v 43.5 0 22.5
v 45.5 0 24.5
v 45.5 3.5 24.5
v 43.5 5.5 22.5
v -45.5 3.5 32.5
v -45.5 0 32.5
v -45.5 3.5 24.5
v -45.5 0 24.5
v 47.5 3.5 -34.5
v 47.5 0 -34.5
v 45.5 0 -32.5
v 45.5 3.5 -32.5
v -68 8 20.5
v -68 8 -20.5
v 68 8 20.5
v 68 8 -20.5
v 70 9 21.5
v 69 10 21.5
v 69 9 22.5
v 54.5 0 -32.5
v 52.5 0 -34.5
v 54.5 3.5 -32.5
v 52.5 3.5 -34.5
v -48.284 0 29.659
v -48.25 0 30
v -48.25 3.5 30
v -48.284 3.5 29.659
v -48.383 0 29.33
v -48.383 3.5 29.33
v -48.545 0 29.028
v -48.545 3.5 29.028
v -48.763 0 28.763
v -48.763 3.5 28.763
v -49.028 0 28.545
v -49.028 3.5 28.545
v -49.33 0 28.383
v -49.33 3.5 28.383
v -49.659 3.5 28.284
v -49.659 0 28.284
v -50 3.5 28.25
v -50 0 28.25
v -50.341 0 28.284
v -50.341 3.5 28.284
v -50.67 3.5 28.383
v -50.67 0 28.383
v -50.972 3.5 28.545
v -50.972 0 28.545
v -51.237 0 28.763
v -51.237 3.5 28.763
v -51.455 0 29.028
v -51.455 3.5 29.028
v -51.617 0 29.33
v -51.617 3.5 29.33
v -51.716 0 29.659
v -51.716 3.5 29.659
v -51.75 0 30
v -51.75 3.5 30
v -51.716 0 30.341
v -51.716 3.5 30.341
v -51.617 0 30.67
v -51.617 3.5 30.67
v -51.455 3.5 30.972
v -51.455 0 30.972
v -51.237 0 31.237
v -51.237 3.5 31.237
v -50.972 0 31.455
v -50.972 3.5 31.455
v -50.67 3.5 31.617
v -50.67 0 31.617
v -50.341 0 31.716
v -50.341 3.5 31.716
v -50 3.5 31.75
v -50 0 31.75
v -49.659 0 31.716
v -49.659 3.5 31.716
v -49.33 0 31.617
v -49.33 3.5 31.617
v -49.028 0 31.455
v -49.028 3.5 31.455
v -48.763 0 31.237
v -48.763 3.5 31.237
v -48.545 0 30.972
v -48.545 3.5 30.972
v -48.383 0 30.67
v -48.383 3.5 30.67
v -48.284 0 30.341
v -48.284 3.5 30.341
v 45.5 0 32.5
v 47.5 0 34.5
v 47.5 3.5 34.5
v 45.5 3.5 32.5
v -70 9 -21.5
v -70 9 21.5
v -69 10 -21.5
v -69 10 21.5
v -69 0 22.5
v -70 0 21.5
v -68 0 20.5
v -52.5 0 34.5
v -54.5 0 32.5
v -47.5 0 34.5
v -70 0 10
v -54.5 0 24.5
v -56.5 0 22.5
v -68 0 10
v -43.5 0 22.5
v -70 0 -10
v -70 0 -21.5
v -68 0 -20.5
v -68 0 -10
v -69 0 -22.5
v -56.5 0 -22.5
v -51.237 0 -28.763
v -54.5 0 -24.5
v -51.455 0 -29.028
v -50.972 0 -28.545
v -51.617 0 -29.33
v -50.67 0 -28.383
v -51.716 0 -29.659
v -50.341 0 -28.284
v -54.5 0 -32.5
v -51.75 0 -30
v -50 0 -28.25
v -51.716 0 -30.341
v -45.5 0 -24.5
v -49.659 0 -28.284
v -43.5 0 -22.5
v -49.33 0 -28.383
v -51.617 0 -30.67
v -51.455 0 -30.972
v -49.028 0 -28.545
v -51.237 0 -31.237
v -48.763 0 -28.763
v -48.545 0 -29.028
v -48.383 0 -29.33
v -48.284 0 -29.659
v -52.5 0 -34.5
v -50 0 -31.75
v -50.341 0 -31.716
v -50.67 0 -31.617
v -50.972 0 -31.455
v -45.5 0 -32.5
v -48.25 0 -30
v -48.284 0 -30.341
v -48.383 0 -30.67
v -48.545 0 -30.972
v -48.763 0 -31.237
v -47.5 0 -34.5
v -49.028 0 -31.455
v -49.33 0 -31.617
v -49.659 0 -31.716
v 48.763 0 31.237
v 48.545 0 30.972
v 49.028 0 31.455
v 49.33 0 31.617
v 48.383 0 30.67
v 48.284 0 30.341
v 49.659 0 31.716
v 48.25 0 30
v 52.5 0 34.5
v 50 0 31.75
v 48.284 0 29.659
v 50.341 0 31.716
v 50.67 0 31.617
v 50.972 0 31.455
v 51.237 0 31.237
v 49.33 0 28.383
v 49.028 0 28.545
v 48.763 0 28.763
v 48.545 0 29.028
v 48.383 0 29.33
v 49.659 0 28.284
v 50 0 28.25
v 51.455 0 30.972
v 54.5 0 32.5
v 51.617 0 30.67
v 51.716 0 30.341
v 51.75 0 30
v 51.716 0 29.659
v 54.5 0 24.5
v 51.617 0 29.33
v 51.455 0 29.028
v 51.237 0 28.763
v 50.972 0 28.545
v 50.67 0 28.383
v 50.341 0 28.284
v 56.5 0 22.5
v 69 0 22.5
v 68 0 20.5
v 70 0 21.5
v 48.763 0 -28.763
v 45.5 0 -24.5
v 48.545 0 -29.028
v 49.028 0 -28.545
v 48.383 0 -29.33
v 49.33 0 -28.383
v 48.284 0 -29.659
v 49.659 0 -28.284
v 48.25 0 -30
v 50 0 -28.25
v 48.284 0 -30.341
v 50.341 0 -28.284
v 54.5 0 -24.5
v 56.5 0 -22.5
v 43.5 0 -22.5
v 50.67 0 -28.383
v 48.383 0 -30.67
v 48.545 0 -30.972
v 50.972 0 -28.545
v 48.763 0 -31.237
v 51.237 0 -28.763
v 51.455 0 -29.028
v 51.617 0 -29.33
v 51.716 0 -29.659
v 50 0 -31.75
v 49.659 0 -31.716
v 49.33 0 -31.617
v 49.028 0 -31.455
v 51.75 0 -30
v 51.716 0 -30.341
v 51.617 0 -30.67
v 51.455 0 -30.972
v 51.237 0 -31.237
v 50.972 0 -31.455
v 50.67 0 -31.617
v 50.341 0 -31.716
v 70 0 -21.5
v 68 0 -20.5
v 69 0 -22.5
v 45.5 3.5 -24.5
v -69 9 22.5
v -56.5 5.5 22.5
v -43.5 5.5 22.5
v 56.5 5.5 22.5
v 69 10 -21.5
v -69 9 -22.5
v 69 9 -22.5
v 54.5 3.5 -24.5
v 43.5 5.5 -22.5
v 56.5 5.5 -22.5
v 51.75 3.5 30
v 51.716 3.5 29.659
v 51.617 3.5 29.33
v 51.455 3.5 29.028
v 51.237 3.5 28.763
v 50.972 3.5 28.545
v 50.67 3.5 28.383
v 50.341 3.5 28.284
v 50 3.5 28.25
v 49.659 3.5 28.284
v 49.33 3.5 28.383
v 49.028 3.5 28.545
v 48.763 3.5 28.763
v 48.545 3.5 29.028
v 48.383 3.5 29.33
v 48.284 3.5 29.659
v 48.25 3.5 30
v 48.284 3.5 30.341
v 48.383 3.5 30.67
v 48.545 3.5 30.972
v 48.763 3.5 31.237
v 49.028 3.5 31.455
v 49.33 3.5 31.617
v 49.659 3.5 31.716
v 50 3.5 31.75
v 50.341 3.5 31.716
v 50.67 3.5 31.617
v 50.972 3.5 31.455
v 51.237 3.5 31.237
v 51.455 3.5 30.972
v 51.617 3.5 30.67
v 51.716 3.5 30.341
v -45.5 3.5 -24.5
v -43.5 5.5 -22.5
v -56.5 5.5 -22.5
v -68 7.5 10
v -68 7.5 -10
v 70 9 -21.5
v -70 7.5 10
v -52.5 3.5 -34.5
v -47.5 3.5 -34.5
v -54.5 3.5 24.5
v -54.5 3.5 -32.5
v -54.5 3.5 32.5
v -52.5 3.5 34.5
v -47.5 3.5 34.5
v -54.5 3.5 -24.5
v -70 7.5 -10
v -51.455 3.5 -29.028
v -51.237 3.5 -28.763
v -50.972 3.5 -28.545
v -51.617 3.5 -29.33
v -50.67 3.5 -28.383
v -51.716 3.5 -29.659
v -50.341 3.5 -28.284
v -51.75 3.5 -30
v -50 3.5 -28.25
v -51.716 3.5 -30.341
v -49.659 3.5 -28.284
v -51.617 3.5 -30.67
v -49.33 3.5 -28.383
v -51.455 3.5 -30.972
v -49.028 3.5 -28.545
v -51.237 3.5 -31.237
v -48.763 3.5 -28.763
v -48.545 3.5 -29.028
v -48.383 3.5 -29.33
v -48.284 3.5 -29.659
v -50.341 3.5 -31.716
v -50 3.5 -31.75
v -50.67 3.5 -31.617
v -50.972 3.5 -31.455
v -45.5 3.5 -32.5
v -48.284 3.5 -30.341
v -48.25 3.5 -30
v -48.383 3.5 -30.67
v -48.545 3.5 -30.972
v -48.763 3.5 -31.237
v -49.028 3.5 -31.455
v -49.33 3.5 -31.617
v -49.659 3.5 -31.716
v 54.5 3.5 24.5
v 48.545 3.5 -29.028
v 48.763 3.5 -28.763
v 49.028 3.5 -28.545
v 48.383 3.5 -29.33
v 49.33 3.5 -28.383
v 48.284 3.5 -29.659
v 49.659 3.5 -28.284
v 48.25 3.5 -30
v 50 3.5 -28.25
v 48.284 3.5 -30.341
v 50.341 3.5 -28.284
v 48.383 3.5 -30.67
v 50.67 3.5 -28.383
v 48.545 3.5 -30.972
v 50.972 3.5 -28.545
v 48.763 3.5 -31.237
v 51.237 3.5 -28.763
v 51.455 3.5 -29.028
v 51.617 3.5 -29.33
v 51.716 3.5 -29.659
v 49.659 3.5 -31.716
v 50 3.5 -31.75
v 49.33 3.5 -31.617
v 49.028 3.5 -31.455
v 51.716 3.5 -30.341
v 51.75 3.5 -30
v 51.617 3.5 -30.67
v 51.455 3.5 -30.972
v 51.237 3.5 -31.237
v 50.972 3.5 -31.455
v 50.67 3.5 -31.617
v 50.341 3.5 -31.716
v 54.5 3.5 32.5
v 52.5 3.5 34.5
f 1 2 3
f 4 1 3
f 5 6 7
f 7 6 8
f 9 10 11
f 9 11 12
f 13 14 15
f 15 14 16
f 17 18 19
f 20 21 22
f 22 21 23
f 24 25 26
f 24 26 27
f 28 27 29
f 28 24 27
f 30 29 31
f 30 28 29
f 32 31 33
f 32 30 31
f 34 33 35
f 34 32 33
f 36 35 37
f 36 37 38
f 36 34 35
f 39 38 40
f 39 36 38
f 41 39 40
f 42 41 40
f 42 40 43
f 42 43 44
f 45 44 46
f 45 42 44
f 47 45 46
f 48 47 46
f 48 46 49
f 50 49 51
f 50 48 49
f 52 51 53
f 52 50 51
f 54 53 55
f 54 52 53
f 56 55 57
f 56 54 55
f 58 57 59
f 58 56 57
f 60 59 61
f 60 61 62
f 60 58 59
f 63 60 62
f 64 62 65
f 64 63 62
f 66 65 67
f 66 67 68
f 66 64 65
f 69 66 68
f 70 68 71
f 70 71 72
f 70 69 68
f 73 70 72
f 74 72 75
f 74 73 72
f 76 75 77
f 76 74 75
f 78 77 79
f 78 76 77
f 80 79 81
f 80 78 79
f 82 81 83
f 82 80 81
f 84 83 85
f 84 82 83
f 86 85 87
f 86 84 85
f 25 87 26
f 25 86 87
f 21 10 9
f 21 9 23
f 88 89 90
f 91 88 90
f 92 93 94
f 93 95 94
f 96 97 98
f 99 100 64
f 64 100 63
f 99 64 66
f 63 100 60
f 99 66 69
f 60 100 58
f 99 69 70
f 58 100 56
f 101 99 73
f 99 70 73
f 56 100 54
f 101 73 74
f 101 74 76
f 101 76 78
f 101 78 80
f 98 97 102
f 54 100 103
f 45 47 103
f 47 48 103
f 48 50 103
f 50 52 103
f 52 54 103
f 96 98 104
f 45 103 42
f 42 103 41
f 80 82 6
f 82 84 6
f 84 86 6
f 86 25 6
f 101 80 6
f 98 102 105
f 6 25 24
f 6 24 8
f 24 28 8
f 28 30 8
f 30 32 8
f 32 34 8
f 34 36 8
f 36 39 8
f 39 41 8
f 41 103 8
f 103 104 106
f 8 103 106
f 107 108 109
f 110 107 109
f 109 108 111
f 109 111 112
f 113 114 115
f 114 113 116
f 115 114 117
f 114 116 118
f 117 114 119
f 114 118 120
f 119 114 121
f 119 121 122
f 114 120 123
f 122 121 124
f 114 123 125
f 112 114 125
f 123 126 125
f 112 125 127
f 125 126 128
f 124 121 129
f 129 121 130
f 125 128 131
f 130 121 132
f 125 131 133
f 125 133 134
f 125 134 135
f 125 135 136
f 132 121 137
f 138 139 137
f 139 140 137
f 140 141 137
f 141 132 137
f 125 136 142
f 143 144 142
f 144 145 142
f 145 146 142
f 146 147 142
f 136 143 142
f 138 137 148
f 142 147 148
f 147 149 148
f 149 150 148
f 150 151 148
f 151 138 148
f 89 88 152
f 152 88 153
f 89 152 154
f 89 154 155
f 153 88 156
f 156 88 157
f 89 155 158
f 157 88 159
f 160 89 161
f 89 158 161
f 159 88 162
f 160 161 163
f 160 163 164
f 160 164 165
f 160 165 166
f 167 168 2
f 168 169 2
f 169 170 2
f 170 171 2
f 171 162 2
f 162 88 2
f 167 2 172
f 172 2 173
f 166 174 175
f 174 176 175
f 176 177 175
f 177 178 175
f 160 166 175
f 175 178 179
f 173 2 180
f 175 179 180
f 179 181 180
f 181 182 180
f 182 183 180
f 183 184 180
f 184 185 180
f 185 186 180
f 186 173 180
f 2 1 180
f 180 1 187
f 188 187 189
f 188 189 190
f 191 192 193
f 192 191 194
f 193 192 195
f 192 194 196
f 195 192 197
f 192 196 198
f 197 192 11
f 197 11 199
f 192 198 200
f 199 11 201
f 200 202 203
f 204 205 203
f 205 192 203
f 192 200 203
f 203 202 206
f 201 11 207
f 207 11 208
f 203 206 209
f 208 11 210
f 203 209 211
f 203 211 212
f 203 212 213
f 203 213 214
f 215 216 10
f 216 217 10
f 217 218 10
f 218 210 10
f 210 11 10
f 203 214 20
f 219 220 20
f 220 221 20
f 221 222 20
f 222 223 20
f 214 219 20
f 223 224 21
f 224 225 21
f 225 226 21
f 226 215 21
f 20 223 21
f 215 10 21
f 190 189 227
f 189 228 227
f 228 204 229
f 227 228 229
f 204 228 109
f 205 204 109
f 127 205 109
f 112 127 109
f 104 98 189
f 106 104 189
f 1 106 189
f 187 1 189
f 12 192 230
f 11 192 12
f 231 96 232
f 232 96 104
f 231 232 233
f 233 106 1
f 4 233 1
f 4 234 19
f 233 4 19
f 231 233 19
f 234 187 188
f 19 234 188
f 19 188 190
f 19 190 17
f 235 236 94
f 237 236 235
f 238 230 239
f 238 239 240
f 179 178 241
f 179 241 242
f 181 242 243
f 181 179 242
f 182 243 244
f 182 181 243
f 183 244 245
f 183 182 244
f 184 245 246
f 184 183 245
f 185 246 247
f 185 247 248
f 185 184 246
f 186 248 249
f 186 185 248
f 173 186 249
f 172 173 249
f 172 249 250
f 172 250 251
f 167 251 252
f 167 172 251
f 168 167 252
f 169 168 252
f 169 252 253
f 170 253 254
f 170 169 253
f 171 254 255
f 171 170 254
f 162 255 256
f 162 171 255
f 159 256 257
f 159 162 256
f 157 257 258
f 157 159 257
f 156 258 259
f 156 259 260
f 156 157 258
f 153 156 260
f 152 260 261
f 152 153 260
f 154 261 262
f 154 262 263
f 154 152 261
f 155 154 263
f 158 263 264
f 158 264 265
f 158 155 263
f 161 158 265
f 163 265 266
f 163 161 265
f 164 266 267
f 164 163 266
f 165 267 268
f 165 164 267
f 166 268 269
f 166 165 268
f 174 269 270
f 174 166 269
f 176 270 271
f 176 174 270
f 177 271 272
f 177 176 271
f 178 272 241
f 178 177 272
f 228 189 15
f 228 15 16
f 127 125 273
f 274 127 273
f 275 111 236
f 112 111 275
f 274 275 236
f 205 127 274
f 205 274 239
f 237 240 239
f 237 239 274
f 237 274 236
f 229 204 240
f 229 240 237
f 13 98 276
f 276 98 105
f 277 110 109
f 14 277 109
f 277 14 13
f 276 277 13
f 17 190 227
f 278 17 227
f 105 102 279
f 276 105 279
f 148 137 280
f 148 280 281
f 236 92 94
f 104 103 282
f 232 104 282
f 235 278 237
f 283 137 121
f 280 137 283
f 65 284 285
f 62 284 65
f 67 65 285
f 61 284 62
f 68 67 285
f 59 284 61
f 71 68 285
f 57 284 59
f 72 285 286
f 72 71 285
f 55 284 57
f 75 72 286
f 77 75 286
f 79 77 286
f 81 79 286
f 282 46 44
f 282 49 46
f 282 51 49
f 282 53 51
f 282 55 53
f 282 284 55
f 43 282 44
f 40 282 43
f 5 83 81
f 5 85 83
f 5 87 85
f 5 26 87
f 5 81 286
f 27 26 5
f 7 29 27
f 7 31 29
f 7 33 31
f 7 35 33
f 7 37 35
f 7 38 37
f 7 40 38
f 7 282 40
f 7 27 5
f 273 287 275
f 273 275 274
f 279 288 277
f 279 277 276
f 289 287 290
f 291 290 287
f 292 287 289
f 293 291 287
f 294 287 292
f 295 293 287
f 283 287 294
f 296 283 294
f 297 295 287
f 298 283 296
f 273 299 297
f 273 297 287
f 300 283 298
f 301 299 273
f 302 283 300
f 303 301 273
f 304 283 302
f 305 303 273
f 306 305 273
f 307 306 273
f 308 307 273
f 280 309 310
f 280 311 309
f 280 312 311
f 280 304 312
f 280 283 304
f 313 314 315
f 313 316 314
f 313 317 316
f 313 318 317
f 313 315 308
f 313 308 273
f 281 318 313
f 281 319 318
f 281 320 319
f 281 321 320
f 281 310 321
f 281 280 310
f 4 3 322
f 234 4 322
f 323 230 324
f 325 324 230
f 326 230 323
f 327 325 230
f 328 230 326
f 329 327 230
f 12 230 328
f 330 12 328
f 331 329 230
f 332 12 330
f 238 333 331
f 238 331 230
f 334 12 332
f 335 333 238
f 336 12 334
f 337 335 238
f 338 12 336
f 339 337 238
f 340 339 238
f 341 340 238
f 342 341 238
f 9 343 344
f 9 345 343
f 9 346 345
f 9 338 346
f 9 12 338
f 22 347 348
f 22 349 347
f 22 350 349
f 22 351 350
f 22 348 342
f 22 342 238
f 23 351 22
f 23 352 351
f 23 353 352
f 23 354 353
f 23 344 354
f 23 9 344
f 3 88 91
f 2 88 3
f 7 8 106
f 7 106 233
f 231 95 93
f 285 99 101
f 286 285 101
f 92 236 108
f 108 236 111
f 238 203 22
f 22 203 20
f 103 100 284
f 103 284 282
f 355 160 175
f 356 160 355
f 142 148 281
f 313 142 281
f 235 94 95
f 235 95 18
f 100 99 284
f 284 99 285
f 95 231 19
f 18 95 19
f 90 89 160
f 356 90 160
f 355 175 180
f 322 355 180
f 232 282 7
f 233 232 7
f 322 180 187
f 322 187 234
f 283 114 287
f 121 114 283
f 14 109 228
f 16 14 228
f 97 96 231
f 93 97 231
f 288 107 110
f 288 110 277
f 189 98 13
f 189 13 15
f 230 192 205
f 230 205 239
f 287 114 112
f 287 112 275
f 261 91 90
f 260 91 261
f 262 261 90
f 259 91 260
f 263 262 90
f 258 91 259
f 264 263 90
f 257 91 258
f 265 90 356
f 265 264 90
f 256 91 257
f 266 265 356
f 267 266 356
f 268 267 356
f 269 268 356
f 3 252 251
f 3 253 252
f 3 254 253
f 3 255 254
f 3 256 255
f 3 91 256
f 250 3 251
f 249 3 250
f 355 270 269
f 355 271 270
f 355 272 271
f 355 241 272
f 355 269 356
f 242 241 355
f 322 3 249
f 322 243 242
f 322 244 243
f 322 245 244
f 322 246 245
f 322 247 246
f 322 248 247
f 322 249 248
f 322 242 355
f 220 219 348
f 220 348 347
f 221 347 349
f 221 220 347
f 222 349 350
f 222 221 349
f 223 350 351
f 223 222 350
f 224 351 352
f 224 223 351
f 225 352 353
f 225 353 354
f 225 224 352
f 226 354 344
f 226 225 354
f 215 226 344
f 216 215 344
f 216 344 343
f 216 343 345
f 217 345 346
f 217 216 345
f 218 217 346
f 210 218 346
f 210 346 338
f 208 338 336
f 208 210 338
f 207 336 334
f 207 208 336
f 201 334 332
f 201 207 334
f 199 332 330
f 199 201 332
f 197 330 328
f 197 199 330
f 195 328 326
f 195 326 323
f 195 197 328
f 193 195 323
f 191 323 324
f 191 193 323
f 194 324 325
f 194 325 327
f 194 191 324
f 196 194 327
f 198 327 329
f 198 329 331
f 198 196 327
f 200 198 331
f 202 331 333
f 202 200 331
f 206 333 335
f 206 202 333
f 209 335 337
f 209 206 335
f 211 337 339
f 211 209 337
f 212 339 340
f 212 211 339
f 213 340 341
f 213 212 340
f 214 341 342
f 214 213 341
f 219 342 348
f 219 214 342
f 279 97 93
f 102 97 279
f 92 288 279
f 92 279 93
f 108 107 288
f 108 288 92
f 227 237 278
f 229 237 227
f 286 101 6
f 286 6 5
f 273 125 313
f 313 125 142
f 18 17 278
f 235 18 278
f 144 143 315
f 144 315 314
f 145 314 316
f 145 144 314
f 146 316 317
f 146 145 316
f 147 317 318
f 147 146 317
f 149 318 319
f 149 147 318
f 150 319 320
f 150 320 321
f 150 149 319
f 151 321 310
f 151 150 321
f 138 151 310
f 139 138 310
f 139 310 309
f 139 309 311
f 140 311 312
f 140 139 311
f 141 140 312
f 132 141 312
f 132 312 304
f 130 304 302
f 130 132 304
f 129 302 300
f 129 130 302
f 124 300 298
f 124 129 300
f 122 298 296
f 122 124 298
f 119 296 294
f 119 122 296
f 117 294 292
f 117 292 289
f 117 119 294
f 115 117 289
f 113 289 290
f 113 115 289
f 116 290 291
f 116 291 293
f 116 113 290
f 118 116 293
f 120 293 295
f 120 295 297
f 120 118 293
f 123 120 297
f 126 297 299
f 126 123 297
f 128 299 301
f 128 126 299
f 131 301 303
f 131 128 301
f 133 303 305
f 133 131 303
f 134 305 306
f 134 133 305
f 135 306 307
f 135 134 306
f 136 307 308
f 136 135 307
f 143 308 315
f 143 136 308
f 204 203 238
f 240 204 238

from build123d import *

# Parameters (mm, degrees)
CROQUIS1_W              = 140
CROQUIS1_H              = 45
CROQUIS1_W_2            = 136
CROQUIS1_H_2            = 41
SALIENTE_EXTRUIR1_DEPTH = 10
CROQUIS2_W              = 140
CROQUIS2_H              = 45
SALIENTE_EXTRUIR2_DEPTH = 2
CHAFL_N1_SIZE           = 1
CROQUIS3_W              = 9
CROQUIS3_H              = 12
CROQUIS3_R              = 1.75
SALIENTE_EXTRUIR3_DEPTH = 3.5
CHAFL_N2_SIZE           = 2
CROQUIS4_W              = 20
CROQUIS4_H              = 7.5
CORTAR_EXTRUIR1_DEPTH   = 3.5


with BuildPart() as part:
    # Croquis1 → Saliente-Extruir1 (new body)
    with BuildSketch(Plane(origin=(0, 0, 0), x_dir=(1, 0, 0), z_dir=(0, 1, 0))):
        Rectangle(CROQUIS1_W, CROQUIS1_H)
        Rectangle(CROQUIS1_W_2, CROQUIS1_H_2, mode=Mode.SUBTRACT)
    extrude(amount=SALIENTE_EXTRUIR1_DEPTH)

    # Croquis2 → Saliente-Extruir2 (add)
    with BuildSketch(Plane(origin=(0, 10, 0), x_dir=(1, 0, 0), z_dir=(0, 1, 0))):
        Rectangle(CROQUIS2_W, CROQUIS2_H)
    extrude(amount=-SALIENTE_EXTRUIR2_DEPTH)

    # Chaflán1
    chafl_n1_edges = [part.edges().sort_by_distance(p)[0] for p in [
        (-70, 10, 0),
        (0, 10, 22.5),
        (70, 10, 0),
        (70, 5, 22.5),
        (-70, 5, 22.5),
        (-70, 5, -22.5),
        (70, 5, -22.5),
        (0, 10, -22.5),
    ]]
    chamfer(chafl_n1_edges, length=CHAFL_N1_SIZE)

    # Croquis3 → Saliente-Extruir3 (add)
    with BuildSketch(Plane(origin=(0, 0, 0), x_dir=(1, 0, 0), z_dir=(0, 1, 0))):
        with Locations((-50, 28.5)):
            Rectangle(CROQUIS3_W, CROQUIS3_H)
        with Locations((-50, 30)):
            Circle(CROQUIS3_R, mode=Mode.SUBTRACT)
        with Locations((50, 28.5)):
            Rectangle(CROQUIS3_W, CROQUIS3_H)
        with Locations((50, 30)):
            Circle(CROQUIS3_R, mode=Mode.SUBTRACT)
        with Locations((-50, -28.5)):
            Rectangle(CROQUIS3_W, CROQUIS3_H)
        with Locations((-50, -30)):
            Circle(CROQUIS3_R, mode=Mode.SUBTRACT)
        with Locations((50, -28.5)):
            Rectangle(CROQUIS3_W, CROQUIS3_H)
        with Locations((50, -30)):
            Circle(CROQUIS3_R, mode=Mode.SUBTRACT)
    extrude(amount=SALIENTE_EXTRUIR3_DEPTH)

    # Chaflán2
    chafl_n2_edges = [part.edges().sort_by_distance(p)[0] for p in [
        (-50, 3.5, 22.5),
        (-54.5, 1.75, 22.5),
        (-54.5, 1.75, 34.5),
        (-45.5, 1.75, 34.5),
        (-45.5, 1.75, 22.5),
        (50, 3.5, 22.5),
        (45.5, 1.75, 22.5),
        (45.5, 1.75, 34.5),
        (54.5, 1.75, 34.5),
        (54.5, 1.75, 22.5),
        (-50, 3.5, -22.5),
        (-54.5, 1.75, -34.5),
        (-54.5, 1.75, -22.5),
        (-45.5, 1.75, -22.5),
        (-45.5, 1.75, -34.5),
        (50, 3.5, -22.5),
        (45.5, 1.75, -34.5),
        (45.5, 1.75, -22.5),
        (54.5, 1.75, -22.5),
        (54.5, 1.75, -34.5),
    ]]
    chamfer(chafl_n2_edges, length=CHAFL_N2_SIZE)

    # Croquis4 → Cortar-Extruir1 (cut)
    with BuildSketch(Plane.ZY.offset(70)):
        with Locations((0, 3.75)):
            Rectangle(CROQUIS4_W, CROQUIS4_H)
    extrude(amount=-CORTAR_EXTRUIR1_DEPTH, mode=Mode.SUBTRACT)


solid = part.part
